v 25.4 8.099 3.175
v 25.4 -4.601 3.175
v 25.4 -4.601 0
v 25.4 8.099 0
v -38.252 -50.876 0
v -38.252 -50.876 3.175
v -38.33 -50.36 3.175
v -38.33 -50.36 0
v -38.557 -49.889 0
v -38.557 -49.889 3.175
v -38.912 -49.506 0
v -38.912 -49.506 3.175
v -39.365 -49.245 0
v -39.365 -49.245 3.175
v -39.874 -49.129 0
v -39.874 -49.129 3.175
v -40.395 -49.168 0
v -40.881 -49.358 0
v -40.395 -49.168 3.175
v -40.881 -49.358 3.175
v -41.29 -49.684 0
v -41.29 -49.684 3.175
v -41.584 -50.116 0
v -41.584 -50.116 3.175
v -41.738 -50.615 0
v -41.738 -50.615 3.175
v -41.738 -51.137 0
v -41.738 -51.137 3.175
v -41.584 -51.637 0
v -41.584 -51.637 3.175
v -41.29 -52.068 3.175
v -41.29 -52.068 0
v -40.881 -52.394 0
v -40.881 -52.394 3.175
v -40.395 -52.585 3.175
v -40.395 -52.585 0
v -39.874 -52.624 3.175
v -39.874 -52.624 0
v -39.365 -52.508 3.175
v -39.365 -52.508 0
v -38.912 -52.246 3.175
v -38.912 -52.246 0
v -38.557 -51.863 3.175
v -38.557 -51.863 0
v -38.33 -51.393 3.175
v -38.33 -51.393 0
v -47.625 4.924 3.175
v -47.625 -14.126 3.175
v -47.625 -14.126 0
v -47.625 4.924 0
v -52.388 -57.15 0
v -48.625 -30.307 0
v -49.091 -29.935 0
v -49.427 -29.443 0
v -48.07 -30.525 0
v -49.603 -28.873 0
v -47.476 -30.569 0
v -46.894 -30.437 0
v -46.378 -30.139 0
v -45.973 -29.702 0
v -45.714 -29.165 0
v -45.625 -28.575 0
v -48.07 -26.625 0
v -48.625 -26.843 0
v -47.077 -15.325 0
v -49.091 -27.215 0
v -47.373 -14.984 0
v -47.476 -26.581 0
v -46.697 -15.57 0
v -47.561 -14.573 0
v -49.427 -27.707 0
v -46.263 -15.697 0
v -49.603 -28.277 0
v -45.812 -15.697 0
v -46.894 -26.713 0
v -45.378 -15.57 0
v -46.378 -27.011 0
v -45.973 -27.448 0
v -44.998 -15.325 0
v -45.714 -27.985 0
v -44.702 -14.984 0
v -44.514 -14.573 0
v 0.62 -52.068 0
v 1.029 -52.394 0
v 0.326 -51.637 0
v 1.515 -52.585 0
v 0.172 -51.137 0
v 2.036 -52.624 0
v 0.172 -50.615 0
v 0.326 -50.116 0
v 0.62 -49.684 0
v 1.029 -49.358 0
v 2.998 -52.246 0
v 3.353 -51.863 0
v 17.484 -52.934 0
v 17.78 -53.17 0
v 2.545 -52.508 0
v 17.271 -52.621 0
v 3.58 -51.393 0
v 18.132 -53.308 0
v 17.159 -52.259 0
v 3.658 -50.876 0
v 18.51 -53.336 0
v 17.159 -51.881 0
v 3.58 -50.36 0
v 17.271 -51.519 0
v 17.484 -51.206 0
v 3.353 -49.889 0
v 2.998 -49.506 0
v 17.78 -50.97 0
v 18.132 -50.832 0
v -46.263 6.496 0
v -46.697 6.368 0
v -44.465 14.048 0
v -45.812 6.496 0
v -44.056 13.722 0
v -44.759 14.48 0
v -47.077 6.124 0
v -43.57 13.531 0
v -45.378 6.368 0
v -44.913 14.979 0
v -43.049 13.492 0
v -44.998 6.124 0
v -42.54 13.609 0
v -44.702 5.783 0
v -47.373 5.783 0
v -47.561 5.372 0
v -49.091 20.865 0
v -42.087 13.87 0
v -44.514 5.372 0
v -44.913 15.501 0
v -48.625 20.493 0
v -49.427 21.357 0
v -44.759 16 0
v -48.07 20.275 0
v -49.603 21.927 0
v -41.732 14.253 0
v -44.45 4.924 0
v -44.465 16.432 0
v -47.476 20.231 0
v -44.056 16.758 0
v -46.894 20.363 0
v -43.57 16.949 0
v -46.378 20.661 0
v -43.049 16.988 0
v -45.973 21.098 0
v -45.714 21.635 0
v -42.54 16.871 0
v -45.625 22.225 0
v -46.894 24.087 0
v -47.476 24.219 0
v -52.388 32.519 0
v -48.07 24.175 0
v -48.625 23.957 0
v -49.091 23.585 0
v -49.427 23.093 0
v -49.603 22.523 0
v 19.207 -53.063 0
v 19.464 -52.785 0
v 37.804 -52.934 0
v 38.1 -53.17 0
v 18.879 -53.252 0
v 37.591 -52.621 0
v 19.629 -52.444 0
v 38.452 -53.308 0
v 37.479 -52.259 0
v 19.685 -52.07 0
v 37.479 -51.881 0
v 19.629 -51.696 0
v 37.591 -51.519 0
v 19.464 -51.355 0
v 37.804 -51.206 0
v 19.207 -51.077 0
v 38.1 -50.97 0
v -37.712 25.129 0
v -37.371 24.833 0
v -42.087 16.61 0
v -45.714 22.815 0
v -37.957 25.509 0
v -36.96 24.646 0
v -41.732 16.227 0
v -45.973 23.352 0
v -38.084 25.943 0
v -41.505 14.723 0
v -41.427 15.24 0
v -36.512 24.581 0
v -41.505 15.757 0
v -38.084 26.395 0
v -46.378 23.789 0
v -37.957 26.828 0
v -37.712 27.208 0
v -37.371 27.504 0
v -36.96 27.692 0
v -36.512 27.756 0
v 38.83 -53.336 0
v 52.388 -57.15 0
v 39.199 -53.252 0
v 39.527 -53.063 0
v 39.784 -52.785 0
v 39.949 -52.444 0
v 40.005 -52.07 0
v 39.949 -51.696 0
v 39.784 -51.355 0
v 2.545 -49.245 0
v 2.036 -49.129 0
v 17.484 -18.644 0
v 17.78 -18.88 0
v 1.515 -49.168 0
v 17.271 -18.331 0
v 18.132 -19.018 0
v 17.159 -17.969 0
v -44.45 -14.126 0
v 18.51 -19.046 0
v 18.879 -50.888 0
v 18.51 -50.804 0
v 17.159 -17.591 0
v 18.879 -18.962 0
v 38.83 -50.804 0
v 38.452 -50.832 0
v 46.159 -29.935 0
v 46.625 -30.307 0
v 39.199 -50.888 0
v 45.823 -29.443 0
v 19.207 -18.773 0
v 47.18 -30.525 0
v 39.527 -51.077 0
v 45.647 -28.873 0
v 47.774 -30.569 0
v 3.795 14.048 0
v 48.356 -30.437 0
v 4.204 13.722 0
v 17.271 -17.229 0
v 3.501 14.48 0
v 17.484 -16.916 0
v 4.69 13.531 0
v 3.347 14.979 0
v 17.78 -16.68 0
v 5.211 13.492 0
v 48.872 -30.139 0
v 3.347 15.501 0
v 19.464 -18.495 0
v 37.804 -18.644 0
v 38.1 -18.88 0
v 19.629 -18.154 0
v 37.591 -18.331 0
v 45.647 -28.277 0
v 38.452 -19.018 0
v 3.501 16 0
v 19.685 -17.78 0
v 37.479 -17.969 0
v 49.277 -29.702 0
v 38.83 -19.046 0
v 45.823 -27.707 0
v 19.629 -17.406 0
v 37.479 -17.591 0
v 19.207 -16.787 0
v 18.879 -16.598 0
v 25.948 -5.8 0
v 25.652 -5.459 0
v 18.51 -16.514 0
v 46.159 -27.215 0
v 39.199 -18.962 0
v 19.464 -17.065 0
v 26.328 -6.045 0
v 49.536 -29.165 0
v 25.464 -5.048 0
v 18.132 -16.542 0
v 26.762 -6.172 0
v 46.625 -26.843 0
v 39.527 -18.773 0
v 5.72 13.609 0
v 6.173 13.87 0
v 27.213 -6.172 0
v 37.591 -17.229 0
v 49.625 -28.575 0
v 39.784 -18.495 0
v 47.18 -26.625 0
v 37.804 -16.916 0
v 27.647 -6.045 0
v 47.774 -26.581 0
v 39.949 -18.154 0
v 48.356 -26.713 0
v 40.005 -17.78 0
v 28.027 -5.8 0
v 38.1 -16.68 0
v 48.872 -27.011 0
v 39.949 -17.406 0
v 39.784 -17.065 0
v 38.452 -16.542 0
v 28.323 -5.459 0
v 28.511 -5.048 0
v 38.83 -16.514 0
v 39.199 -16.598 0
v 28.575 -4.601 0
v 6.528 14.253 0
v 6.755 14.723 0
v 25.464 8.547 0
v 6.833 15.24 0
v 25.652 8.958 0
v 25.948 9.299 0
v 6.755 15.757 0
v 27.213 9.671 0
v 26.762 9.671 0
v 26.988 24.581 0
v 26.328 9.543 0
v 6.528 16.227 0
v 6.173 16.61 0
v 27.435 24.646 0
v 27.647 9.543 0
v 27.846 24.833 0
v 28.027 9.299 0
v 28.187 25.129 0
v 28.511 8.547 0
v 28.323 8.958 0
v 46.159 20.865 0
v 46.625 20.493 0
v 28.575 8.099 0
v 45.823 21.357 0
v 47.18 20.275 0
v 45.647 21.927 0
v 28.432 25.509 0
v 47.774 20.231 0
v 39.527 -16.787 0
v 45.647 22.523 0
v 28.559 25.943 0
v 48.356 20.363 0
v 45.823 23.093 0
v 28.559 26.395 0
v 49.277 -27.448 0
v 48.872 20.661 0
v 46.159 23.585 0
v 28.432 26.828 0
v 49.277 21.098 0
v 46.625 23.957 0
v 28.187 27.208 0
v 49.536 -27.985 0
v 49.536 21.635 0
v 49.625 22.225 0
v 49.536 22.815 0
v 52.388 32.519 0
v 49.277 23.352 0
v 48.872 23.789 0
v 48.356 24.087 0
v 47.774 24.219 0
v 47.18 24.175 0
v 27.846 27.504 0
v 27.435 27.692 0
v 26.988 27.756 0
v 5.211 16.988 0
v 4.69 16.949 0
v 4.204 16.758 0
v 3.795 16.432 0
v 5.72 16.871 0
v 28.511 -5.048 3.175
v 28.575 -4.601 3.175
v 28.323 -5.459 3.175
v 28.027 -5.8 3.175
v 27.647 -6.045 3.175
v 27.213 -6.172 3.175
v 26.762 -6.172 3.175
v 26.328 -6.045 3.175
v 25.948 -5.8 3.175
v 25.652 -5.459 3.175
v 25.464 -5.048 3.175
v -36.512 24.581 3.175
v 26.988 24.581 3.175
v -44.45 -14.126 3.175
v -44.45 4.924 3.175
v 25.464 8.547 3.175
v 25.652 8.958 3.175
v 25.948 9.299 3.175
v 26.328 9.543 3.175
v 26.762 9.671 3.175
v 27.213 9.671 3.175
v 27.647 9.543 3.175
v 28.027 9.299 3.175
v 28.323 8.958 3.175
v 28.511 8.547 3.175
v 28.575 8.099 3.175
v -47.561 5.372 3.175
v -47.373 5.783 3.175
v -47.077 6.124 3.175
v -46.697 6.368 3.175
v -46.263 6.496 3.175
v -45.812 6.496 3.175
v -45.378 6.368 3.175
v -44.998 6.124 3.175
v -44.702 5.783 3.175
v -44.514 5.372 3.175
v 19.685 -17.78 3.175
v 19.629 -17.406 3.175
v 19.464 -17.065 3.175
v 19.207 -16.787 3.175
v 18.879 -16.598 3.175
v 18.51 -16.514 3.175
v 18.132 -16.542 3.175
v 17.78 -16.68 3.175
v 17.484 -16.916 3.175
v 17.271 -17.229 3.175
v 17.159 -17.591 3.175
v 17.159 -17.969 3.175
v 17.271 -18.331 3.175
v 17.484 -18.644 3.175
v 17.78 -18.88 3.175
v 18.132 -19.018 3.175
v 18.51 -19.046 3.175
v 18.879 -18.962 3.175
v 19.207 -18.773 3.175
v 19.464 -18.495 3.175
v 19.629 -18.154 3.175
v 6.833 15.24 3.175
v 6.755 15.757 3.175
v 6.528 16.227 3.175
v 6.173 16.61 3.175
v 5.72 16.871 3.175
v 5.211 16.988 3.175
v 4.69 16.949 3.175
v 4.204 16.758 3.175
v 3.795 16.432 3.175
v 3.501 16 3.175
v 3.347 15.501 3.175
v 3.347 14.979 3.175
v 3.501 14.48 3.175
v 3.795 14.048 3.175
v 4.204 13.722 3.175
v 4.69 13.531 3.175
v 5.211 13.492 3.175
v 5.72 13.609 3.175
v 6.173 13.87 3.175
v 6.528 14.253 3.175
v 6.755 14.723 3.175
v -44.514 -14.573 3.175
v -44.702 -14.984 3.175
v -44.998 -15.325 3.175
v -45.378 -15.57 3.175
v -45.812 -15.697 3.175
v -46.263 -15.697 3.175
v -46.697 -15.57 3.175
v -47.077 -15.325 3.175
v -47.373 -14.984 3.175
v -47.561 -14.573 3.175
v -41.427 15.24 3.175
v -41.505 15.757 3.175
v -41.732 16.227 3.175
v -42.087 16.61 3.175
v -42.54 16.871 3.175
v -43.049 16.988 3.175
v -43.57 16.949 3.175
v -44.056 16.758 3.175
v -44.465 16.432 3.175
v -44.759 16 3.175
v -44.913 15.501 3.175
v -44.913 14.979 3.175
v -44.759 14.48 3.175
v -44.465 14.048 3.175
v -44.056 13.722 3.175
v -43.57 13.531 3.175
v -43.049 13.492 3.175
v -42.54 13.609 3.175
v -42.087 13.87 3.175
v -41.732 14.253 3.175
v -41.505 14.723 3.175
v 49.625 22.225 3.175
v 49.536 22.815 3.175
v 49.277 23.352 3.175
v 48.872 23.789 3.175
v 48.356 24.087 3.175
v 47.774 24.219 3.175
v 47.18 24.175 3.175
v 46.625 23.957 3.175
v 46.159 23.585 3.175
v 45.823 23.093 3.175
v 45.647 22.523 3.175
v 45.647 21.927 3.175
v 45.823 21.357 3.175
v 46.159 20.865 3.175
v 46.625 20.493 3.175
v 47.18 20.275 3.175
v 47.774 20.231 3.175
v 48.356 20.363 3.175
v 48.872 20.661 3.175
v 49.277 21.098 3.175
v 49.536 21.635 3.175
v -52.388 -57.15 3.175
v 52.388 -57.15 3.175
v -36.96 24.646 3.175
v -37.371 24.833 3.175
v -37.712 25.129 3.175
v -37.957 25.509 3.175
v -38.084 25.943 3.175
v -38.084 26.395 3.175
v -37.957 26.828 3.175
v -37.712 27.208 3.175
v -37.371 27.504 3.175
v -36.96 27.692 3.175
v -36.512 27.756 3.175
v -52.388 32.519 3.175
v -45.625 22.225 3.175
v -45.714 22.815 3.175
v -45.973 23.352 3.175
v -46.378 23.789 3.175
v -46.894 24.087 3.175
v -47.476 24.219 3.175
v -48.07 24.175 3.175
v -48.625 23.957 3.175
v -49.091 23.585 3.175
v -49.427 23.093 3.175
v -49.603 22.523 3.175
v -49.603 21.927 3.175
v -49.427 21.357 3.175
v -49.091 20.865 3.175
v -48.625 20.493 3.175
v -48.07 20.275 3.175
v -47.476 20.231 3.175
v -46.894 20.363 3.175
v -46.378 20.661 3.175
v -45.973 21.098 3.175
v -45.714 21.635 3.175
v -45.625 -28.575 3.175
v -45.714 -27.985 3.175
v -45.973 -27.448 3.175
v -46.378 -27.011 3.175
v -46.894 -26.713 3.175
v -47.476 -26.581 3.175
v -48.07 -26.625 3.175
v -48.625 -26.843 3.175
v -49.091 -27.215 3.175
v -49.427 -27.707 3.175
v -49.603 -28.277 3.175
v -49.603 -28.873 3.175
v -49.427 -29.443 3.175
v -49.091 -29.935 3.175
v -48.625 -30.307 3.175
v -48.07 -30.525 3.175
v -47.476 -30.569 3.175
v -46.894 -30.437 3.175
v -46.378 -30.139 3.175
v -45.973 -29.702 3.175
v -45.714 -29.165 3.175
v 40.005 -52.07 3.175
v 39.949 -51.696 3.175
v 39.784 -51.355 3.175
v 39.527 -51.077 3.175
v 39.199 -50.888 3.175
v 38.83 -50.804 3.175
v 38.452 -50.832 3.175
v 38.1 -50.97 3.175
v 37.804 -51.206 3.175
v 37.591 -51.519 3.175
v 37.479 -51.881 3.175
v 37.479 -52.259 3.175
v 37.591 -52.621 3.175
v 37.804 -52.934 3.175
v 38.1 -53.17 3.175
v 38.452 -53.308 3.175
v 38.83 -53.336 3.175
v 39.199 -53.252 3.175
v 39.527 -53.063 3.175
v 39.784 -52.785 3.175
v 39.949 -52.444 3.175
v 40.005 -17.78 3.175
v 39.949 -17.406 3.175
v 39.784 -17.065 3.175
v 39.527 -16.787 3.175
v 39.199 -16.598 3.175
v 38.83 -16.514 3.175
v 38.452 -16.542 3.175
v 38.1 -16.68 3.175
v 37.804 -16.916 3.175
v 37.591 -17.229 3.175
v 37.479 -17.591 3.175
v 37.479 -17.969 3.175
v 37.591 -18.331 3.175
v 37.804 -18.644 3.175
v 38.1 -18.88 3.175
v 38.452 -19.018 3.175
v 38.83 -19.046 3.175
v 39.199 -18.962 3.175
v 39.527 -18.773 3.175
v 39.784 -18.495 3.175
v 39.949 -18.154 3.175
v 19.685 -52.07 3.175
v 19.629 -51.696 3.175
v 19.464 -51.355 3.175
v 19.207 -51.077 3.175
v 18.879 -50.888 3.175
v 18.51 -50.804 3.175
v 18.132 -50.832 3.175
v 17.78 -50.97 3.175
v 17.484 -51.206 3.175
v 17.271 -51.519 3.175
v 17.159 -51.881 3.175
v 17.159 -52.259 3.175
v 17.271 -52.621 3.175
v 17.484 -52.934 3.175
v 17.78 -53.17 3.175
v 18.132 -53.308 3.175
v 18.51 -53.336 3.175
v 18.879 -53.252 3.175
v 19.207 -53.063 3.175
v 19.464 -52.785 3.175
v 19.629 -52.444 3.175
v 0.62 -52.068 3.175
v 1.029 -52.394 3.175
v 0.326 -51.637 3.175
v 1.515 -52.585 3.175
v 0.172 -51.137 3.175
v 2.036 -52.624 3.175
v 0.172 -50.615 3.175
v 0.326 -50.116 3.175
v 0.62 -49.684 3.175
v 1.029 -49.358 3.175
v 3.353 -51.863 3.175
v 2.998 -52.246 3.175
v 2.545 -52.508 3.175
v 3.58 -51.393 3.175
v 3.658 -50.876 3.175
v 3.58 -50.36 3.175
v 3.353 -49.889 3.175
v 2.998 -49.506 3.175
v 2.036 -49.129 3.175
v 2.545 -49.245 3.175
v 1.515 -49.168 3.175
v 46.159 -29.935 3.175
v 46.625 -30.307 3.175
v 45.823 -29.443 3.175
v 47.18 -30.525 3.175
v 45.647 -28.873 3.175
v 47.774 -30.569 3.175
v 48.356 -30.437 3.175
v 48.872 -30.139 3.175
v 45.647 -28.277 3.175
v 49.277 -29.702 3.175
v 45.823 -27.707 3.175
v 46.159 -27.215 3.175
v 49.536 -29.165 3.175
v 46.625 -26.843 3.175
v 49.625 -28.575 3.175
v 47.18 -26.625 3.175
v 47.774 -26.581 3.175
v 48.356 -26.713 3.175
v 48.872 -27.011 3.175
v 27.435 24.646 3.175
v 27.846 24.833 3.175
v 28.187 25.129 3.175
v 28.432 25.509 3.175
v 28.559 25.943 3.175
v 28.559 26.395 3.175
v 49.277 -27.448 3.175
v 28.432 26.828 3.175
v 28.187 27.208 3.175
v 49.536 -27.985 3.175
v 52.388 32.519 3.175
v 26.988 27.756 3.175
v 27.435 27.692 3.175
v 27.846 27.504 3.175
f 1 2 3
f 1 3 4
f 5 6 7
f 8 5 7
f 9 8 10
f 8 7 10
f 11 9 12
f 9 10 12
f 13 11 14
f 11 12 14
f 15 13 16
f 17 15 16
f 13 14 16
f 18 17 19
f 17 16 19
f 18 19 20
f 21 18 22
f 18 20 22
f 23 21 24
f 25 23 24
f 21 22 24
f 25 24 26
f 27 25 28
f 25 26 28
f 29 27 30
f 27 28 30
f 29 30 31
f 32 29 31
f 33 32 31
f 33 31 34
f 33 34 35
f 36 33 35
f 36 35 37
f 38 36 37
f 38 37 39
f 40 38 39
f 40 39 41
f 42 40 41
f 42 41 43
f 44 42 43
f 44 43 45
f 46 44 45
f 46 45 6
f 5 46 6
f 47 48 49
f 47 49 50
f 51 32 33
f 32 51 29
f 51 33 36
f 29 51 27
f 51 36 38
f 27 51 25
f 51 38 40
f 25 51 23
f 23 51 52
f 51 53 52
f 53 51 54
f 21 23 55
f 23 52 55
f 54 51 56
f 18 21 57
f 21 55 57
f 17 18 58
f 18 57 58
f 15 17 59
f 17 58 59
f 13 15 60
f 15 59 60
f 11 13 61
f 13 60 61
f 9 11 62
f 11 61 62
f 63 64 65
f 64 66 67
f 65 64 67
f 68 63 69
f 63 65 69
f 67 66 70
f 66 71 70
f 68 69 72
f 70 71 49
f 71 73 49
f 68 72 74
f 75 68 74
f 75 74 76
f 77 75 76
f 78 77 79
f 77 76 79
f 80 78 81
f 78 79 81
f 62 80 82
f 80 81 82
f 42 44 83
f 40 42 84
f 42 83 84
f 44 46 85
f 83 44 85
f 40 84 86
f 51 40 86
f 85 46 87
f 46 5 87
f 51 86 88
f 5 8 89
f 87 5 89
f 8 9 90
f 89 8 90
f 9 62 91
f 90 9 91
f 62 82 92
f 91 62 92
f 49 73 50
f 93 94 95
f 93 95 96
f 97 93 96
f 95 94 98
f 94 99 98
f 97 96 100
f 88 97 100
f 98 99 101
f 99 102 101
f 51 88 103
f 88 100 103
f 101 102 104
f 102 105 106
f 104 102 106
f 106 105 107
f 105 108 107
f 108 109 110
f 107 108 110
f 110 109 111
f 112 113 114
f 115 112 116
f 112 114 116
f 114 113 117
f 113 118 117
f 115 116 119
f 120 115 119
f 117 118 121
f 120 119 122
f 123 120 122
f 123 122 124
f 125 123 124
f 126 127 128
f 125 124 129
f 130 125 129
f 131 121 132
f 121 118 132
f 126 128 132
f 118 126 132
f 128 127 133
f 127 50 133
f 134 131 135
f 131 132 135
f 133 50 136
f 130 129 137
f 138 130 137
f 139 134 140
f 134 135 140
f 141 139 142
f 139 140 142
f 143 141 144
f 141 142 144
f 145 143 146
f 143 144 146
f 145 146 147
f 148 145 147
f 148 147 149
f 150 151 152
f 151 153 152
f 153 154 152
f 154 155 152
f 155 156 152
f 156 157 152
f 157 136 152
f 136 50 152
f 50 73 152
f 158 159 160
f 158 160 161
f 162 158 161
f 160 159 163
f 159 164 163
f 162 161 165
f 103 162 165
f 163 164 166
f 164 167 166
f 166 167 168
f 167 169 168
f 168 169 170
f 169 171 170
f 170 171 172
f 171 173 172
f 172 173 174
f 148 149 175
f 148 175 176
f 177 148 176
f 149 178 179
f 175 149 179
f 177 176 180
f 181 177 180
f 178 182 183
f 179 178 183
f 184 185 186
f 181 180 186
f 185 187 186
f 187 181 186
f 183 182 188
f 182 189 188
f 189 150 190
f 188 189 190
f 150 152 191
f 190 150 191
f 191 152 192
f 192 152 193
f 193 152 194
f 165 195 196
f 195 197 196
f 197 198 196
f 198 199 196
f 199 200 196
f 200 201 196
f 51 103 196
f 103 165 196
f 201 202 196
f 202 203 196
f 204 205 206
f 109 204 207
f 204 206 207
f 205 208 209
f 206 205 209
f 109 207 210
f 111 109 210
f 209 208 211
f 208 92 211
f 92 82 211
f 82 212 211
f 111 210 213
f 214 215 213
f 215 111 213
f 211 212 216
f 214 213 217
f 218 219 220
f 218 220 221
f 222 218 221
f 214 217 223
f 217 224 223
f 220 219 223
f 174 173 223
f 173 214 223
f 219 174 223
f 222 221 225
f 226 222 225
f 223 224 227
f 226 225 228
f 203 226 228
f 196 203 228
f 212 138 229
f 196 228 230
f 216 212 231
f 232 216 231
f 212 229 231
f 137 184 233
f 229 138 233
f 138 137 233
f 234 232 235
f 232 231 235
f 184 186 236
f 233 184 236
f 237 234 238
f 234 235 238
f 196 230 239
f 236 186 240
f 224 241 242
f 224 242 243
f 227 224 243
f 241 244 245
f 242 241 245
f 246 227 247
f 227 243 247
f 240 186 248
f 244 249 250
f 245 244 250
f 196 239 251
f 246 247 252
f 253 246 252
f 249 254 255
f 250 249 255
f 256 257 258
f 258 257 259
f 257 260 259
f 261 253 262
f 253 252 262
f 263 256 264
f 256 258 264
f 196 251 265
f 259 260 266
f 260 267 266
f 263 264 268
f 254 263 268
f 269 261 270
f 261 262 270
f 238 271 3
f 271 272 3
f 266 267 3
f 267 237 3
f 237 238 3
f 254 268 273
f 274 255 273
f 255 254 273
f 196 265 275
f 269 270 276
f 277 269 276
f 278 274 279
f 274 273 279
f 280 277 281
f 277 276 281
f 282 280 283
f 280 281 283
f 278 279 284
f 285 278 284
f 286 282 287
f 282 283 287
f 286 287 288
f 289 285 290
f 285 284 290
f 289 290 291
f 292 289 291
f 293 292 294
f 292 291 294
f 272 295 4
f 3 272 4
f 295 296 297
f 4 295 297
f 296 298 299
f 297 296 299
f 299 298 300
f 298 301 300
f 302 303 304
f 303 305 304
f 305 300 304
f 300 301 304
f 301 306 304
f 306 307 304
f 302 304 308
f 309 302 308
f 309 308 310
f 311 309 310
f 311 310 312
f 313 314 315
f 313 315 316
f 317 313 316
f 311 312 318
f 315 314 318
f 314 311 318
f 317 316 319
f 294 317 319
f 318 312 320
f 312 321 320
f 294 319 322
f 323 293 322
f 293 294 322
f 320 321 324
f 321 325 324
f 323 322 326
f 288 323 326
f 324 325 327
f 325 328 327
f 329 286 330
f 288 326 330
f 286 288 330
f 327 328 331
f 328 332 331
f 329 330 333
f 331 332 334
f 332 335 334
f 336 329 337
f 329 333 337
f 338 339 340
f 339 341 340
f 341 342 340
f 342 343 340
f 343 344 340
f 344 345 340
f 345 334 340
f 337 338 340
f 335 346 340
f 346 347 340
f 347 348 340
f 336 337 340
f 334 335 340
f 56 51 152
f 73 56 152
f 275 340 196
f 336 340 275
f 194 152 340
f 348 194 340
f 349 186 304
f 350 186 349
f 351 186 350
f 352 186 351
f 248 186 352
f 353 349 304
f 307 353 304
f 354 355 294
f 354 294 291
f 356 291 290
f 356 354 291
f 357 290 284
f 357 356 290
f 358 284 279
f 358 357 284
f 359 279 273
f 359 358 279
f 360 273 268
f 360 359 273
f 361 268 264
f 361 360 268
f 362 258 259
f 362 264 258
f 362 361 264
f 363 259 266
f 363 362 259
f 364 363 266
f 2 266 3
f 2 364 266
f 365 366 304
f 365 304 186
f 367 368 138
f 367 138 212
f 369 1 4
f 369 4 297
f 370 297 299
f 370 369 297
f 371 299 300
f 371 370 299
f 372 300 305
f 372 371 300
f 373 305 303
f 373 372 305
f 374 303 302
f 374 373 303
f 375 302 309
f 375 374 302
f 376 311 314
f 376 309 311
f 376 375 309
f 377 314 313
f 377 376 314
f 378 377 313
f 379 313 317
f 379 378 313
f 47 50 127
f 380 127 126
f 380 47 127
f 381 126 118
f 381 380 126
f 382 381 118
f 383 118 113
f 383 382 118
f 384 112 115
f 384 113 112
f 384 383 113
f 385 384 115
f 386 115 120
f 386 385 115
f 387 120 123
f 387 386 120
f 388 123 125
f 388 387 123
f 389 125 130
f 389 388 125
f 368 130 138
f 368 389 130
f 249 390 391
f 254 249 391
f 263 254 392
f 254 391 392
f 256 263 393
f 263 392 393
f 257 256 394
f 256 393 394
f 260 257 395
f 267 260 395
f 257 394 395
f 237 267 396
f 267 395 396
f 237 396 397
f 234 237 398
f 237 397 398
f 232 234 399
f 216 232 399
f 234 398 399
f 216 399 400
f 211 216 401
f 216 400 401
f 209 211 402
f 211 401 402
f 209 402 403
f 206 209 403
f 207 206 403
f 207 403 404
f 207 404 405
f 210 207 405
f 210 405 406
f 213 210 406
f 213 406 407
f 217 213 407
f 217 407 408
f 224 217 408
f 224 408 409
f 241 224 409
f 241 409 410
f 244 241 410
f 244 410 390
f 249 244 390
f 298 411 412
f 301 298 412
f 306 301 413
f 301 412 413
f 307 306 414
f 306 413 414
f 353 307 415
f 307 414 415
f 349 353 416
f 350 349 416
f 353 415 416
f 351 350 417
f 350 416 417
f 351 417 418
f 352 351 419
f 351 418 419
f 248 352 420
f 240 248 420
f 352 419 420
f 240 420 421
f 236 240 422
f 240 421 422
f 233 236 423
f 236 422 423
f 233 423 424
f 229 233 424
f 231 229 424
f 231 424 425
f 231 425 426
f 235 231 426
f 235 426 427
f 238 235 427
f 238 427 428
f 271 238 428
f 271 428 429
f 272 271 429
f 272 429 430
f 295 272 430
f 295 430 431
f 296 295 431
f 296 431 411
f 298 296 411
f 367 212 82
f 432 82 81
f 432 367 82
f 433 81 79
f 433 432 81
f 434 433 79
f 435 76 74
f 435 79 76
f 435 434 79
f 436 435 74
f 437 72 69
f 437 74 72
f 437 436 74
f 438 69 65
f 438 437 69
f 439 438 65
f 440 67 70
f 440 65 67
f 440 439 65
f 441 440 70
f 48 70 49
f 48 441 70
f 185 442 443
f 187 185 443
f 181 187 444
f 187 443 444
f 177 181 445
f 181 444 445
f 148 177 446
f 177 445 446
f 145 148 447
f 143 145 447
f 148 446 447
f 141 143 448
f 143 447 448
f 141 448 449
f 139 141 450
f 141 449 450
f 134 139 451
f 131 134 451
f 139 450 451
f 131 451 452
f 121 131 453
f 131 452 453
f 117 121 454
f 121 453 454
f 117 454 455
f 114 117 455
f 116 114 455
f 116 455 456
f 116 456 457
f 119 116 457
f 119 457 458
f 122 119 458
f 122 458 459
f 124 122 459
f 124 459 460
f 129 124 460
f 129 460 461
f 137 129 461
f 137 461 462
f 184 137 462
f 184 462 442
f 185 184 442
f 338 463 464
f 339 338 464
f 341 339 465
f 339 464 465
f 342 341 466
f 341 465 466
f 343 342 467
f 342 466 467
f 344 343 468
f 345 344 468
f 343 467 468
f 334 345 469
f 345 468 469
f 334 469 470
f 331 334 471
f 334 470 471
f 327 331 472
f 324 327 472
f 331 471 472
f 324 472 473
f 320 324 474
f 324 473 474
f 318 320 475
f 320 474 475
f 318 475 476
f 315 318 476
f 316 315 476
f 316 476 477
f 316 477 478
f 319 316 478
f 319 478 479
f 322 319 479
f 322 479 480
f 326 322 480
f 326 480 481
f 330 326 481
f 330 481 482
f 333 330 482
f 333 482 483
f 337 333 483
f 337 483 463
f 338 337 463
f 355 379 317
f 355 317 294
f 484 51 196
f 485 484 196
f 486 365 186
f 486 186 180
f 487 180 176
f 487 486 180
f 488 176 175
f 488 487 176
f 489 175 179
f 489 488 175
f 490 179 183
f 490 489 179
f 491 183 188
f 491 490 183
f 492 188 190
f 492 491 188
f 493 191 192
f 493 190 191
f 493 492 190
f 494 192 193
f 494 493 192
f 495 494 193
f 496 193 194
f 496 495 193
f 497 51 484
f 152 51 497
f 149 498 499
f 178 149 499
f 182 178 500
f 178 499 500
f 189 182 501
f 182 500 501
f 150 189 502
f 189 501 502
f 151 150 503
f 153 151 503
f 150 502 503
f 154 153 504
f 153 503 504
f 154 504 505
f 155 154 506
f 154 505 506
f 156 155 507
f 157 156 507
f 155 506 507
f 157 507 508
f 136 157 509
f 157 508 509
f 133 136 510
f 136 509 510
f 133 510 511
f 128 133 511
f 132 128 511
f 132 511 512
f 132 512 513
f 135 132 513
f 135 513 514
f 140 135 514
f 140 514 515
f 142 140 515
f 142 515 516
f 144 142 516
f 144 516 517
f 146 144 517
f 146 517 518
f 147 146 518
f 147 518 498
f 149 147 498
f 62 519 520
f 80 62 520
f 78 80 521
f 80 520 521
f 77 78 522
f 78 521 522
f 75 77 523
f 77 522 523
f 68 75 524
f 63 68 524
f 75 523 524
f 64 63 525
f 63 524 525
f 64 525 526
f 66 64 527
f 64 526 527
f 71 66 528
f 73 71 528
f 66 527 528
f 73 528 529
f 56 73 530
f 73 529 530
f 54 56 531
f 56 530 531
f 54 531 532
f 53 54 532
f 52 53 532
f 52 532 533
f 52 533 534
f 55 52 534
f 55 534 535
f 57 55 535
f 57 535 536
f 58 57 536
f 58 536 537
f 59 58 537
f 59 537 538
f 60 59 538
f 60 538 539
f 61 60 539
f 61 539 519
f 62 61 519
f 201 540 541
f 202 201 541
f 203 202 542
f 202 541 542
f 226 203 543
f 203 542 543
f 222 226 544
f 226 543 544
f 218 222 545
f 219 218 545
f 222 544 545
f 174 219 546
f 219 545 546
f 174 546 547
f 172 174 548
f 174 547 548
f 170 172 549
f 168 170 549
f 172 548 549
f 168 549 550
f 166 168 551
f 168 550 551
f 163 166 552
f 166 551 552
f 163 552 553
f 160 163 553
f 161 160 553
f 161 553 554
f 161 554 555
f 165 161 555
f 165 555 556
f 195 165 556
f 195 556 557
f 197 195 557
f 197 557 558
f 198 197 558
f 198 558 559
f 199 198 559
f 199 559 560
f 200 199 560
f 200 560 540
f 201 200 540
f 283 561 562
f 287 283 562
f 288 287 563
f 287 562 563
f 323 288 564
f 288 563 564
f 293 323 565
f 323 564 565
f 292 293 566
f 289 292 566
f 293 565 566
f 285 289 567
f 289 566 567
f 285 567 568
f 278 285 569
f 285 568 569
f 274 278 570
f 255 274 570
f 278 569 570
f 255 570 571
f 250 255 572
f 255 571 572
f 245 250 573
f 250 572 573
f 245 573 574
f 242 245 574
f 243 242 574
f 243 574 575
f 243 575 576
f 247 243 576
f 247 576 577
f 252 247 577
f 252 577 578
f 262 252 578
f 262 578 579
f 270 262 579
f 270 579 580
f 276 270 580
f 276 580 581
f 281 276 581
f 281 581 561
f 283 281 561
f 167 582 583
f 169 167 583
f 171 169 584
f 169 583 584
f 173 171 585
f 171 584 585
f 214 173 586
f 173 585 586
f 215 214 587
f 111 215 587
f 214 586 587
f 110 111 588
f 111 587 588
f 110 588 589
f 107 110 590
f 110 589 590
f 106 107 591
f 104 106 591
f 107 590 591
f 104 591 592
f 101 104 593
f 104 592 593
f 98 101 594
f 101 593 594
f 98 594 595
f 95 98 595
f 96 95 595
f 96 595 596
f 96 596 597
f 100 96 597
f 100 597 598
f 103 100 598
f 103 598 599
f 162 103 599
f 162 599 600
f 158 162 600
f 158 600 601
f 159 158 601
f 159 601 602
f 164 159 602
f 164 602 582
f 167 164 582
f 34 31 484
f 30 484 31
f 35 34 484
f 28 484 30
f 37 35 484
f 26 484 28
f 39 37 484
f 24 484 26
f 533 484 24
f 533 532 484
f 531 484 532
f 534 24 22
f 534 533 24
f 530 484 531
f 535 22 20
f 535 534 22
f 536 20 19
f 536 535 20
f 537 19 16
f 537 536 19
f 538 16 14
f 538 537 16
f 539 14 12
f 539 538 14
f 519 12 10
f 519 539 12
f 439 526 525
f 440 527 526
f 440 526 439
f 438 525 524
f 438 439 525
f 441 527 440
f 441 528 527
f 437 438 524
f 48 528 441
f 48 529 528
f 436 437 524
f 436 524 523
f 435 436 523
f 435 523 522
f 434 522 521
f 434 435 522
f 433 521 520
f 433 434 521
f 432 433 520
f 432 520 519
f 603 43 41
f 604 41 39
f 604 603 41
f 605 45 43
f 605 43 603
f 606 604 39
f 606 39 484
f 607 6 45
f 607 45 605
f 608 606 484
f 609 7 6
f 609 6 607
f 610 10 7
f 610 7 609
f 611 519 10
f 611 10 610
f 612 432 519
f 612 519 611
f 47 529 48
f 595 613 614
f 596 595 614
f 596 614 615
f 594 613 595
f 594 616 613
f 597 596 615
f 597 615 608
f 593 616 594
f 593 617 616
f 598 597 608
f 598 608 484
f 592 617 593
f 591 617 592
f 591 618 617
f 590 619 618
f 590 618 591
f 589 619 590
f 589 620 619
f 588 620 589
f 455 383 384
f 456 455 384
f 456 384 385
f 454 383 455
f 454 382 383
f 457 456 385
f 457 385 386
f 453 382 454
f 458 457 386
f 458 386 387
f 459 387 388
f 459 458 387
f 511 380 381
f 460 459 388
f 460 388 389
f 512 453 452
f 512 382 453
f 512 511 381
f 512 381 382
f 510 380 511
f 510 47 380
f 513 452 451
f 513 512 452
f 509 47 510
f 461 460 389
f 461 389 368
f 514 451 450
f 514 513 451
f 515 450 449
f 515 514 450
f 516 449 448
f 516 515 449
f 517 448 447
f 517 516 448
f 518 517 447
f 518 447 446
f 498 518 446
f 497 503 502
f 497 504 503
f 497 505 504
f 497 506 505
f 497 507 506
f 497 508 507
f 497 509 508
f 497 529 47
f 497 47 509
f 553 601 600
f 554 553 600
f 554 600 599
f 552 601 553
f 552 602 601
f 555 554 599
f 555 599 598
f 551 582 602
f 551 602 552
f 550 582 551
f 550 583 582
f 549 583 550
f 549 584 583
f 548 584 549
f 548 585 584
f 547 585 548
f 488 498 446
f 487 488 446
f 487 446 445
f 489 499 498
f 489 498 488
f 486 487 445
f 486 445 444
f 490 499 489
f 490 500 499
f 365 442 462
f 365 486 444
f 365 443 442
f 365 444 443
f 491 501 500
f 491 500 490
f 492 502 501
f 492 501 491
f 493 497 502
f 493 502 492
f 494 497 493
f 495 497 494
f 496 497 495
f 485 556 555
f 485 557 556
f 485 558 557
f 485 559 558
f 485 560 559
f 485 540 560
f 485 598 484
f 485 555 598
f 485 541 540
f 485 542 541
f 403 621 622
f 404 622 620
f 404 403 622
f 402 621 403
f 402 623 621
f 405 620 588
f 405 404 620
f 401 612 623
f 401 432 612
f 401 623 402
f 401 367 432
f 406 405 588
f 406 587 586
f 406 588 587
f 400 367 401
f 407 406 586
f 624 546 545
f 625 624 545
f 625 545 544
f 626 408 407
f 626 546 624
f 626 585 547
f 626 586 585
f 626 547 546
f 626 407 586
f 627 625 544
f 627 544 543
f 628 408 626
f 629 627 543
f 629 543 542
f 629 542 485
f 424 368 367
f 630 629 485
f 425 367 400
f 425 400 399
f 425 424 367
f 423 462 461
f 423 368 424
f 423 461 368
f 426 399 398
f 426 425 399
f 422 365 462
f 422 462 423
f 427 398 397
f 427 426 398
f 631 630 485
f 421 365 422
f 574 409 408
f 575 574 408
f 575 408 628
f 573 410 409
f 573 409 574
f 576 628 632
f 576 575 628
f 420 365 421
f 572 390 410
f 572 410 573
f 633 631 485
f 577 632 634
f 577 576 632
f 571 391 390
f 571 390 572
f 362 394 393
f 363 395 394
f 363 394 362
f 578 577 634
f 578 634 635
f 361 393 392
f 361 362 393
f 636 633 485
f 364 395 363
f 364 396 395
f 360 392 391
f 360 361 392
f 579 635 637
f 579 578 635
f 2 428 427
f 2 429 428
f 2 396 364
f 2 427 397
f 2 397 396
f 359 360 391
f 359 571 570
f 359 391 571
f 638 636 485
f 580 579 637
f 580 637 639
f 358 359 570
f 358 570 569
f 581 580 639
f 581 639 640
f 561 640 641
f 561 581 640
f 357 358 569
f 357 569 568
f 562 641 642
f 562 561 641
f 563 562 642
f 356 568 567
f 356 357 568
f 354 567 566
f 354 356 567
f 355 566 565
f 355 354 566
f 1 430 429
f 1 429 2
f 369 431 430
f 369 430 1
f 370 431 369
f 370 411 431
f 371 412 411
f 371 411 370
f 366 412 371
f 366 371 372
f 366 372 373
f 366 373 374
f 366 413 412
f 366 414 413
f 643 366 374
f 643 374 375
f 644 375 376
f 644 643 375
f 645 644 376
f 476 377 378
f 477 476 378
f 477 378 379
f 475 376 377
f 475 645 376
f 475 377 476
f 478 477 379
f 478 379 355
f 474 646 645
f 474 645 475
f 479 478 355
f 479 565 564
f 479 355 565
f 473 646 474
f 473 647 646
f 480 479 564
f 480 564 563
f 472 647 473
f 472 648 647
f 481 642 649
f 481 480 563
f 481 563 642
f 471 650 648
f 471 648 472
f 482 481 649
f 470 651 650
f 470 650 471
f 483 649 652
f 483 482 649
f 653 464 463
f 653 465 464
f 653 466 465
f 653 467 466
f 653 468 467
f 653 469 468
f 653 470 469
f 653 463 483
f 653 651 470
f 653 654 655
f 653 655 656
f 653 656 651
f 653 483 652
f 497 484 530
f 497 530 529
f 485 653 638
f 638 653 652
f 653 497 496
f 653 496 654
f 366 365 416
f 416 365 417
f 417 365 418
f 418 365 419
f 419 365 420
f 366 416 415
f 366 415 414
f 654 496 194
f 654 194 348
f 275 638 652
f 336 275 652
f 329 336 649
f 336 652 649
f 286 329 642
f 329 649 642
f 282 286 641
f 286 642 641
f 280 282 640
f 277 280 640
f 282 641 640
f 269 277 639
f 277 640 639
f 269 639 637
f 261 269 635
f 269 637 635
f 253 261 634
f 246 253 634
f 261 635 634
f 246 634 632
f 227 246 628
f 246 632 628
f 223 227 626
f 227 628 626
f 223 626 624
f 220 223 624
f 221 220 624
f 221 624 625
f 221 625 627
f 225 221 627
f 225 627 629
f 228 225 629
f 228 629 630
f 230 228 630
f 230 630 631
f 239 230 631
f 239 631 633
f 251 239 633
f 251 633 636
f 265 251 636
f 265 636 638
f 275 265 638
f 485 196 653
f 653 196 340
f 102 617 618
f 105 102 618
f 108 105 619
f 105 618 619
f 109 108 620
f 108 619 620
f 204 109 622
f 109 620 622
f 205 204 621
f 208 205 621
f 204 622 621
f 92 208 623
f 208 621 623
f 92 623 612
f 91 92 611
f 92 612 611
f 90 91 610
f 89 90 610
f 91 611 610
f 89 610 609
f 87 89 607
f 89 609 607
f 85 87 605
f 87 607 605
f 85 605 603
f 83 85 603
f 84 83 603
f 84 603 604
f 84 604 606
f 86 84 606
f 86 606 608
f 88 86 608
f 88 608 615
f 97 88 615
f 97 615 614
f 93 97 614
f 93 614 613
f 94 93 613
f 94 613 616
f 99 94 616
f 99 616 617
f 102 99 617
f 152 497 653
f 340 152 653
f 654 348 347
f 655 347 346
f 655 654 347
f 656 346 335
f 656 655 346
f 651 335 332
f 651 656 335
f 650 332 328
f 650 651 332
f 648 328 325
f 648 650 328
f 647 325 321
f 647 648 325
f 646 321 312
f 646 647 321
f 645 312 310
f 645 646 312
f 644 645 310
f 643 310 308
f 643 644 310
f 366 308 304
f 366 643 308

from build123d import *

# Parameters (mm, degrees)
SKETCH1_W           = 104.775
SKETCH1_H           = 114.3
BOSS_EXTRUDE1_DEPTH = 3.175
SKETCH2_R           = 1.7526
CUT_EXTRUDE1_DEPTH  = 78.592868753
SKETCH3_R           = 2
CUT_EXTRUDE2_DEPTH  = 78.592868753
SKETCH4_R           = 1.27
CUT_EXTRUDE3_DEPTH  = 78.592868753
SKETCH5_W           = 104.775
SKETCH5_H           = 49.262233524
CUT_EXTRUDE4_DEPTH  = 15
CUT_EXTRUDE5_DEPTH  = 78.592868753


with BuildPart() as part:
    # Sketch1 → Boss-Extrude1 (new body)
    with BuildSketch(Plane.XY):
        Rectangle(SKETCH1_W, SKETCH1_H)
    extrude(amount=BOSS_EXTRUDE1_DEPTH)

    # Sketch2 → Cut-Extrude1 (cut, through all)
    with BuildSketch(Plane.XY.offset(3.175)):
        with Locations((-43.18, 15.24)):
            Circle(SKETCH2_R)
        with Locations((5.08, 15.24)):
            Circle(SKETCH2_R)
        with Locations((-40.005, -50.8762)):
            Circle(SKETCH2_R)
        with Locations((1.905, -50.8762)):
            Circle(SKETCH2_R)
    extrude(amount=-CUT_EXTRUDE1_DEPTH, mode=Mode.SUBTRACT)

    # Sketch3 → Cut-Extrude2 (cut, through all)
    with BuildSketch(Plane.XY.offset(3.175)):
        with Locations((-47.625, 22.225)):
            Circle(SKETCH3_R)
        with Locations((47.625, 22.225)):
            Circle(SKETCH3_R)
        with Locations((47.625, -28.575)):
            Circle(SKETCH3_R)
        with Locations((-47.625, -28.575)):
            Circle(SKETCH3_R)
    extrude(amount=-CUT_EXTRUDE2_DEPTH, mode=Mode.SUBTRACT)

    # Sketch4 → Cut-Extrude3 (cut, through all)
    with BuildSketch(Plane.XY.offset(3.175)):
        with Locations((18.415, -17.78)):
            Circle(SKETCH4_R)
        with Locations((38.735, -17.78)):
            Circle(SKETCH4_R)
        with Locations((38.735, -52.07)):
            Circle(SKETCH4_R)
        with Locations((18.415, -52.07)):
            Circle(SKETCH4_R)
    extrude(amount=-CUT_EXTRUDE3_DEPTH, mode=Mode.SUBTRACT)

    # Sketch5 → Cut-Extrude4 (cut)
    with BuildSketch(Plane.XY.offset(3.175)):
        with Locations((0, 57.15)):
            Rectangle(SKETCH5_W, SKETCH5_H)
    extrude(amount=-CUT_EXTRUDE4_DEPTH, mode=Mode.SUBTRACT)

    # Sketch7 → Cut-Extrude5 (cut, through all)
    with BuildSketch(Plane.XY.offset(3.175)):
        with BuildLine():
            Line((-44.45, 4.92426118), (-44.45, -14.12573882))
            ThreePointArc((-44.45, -14.12573882), (-46.0375, -15.71323882), (-47.625, -14.12573882))
            Line((-47.625, -14.12573882), (-47.625, 4.92426118))
            ThreePointArc((-47.625, 4.92426118), (-46.0375, 6.51176118), (-44.45, 4.92426118))
        make_face()
        with BuildLine():
            Line((-36.5125, 27.756383238), (26.9875, 27.756383238))
            ThreePointArc((26.9875, 27.756383238), (28.575, 26.168883238), (26.9875, 24.581383238))
            Line((26.9875, 24.581383238), (-36.5125, 24.581383238))
            ThreePointArc((-36.5125, 24.581383238), (-38.1, 26.168883238), (-36.5125, 27.756383238))
        make_face()
        with BuildLine():
            Line((28.575, 8.09926118), (28.575, -4.60073882))
            ThreePointArc((28.575, -4.60073882), (26.9875, -6.18823882), (25.4, -4.60073882))
            Line((25.4, -4.60073882), (25.4, 8.09926118))
            ThreePointArc((25.4, 8.09926118), (26.9875, 9.68676118), (28.575, 8.09926118))
        make_face()
    extrude(amount=-CUT_EXTRUDE5_DEPTH, mode=Mode.SUBTRACT)


solid = part.part
